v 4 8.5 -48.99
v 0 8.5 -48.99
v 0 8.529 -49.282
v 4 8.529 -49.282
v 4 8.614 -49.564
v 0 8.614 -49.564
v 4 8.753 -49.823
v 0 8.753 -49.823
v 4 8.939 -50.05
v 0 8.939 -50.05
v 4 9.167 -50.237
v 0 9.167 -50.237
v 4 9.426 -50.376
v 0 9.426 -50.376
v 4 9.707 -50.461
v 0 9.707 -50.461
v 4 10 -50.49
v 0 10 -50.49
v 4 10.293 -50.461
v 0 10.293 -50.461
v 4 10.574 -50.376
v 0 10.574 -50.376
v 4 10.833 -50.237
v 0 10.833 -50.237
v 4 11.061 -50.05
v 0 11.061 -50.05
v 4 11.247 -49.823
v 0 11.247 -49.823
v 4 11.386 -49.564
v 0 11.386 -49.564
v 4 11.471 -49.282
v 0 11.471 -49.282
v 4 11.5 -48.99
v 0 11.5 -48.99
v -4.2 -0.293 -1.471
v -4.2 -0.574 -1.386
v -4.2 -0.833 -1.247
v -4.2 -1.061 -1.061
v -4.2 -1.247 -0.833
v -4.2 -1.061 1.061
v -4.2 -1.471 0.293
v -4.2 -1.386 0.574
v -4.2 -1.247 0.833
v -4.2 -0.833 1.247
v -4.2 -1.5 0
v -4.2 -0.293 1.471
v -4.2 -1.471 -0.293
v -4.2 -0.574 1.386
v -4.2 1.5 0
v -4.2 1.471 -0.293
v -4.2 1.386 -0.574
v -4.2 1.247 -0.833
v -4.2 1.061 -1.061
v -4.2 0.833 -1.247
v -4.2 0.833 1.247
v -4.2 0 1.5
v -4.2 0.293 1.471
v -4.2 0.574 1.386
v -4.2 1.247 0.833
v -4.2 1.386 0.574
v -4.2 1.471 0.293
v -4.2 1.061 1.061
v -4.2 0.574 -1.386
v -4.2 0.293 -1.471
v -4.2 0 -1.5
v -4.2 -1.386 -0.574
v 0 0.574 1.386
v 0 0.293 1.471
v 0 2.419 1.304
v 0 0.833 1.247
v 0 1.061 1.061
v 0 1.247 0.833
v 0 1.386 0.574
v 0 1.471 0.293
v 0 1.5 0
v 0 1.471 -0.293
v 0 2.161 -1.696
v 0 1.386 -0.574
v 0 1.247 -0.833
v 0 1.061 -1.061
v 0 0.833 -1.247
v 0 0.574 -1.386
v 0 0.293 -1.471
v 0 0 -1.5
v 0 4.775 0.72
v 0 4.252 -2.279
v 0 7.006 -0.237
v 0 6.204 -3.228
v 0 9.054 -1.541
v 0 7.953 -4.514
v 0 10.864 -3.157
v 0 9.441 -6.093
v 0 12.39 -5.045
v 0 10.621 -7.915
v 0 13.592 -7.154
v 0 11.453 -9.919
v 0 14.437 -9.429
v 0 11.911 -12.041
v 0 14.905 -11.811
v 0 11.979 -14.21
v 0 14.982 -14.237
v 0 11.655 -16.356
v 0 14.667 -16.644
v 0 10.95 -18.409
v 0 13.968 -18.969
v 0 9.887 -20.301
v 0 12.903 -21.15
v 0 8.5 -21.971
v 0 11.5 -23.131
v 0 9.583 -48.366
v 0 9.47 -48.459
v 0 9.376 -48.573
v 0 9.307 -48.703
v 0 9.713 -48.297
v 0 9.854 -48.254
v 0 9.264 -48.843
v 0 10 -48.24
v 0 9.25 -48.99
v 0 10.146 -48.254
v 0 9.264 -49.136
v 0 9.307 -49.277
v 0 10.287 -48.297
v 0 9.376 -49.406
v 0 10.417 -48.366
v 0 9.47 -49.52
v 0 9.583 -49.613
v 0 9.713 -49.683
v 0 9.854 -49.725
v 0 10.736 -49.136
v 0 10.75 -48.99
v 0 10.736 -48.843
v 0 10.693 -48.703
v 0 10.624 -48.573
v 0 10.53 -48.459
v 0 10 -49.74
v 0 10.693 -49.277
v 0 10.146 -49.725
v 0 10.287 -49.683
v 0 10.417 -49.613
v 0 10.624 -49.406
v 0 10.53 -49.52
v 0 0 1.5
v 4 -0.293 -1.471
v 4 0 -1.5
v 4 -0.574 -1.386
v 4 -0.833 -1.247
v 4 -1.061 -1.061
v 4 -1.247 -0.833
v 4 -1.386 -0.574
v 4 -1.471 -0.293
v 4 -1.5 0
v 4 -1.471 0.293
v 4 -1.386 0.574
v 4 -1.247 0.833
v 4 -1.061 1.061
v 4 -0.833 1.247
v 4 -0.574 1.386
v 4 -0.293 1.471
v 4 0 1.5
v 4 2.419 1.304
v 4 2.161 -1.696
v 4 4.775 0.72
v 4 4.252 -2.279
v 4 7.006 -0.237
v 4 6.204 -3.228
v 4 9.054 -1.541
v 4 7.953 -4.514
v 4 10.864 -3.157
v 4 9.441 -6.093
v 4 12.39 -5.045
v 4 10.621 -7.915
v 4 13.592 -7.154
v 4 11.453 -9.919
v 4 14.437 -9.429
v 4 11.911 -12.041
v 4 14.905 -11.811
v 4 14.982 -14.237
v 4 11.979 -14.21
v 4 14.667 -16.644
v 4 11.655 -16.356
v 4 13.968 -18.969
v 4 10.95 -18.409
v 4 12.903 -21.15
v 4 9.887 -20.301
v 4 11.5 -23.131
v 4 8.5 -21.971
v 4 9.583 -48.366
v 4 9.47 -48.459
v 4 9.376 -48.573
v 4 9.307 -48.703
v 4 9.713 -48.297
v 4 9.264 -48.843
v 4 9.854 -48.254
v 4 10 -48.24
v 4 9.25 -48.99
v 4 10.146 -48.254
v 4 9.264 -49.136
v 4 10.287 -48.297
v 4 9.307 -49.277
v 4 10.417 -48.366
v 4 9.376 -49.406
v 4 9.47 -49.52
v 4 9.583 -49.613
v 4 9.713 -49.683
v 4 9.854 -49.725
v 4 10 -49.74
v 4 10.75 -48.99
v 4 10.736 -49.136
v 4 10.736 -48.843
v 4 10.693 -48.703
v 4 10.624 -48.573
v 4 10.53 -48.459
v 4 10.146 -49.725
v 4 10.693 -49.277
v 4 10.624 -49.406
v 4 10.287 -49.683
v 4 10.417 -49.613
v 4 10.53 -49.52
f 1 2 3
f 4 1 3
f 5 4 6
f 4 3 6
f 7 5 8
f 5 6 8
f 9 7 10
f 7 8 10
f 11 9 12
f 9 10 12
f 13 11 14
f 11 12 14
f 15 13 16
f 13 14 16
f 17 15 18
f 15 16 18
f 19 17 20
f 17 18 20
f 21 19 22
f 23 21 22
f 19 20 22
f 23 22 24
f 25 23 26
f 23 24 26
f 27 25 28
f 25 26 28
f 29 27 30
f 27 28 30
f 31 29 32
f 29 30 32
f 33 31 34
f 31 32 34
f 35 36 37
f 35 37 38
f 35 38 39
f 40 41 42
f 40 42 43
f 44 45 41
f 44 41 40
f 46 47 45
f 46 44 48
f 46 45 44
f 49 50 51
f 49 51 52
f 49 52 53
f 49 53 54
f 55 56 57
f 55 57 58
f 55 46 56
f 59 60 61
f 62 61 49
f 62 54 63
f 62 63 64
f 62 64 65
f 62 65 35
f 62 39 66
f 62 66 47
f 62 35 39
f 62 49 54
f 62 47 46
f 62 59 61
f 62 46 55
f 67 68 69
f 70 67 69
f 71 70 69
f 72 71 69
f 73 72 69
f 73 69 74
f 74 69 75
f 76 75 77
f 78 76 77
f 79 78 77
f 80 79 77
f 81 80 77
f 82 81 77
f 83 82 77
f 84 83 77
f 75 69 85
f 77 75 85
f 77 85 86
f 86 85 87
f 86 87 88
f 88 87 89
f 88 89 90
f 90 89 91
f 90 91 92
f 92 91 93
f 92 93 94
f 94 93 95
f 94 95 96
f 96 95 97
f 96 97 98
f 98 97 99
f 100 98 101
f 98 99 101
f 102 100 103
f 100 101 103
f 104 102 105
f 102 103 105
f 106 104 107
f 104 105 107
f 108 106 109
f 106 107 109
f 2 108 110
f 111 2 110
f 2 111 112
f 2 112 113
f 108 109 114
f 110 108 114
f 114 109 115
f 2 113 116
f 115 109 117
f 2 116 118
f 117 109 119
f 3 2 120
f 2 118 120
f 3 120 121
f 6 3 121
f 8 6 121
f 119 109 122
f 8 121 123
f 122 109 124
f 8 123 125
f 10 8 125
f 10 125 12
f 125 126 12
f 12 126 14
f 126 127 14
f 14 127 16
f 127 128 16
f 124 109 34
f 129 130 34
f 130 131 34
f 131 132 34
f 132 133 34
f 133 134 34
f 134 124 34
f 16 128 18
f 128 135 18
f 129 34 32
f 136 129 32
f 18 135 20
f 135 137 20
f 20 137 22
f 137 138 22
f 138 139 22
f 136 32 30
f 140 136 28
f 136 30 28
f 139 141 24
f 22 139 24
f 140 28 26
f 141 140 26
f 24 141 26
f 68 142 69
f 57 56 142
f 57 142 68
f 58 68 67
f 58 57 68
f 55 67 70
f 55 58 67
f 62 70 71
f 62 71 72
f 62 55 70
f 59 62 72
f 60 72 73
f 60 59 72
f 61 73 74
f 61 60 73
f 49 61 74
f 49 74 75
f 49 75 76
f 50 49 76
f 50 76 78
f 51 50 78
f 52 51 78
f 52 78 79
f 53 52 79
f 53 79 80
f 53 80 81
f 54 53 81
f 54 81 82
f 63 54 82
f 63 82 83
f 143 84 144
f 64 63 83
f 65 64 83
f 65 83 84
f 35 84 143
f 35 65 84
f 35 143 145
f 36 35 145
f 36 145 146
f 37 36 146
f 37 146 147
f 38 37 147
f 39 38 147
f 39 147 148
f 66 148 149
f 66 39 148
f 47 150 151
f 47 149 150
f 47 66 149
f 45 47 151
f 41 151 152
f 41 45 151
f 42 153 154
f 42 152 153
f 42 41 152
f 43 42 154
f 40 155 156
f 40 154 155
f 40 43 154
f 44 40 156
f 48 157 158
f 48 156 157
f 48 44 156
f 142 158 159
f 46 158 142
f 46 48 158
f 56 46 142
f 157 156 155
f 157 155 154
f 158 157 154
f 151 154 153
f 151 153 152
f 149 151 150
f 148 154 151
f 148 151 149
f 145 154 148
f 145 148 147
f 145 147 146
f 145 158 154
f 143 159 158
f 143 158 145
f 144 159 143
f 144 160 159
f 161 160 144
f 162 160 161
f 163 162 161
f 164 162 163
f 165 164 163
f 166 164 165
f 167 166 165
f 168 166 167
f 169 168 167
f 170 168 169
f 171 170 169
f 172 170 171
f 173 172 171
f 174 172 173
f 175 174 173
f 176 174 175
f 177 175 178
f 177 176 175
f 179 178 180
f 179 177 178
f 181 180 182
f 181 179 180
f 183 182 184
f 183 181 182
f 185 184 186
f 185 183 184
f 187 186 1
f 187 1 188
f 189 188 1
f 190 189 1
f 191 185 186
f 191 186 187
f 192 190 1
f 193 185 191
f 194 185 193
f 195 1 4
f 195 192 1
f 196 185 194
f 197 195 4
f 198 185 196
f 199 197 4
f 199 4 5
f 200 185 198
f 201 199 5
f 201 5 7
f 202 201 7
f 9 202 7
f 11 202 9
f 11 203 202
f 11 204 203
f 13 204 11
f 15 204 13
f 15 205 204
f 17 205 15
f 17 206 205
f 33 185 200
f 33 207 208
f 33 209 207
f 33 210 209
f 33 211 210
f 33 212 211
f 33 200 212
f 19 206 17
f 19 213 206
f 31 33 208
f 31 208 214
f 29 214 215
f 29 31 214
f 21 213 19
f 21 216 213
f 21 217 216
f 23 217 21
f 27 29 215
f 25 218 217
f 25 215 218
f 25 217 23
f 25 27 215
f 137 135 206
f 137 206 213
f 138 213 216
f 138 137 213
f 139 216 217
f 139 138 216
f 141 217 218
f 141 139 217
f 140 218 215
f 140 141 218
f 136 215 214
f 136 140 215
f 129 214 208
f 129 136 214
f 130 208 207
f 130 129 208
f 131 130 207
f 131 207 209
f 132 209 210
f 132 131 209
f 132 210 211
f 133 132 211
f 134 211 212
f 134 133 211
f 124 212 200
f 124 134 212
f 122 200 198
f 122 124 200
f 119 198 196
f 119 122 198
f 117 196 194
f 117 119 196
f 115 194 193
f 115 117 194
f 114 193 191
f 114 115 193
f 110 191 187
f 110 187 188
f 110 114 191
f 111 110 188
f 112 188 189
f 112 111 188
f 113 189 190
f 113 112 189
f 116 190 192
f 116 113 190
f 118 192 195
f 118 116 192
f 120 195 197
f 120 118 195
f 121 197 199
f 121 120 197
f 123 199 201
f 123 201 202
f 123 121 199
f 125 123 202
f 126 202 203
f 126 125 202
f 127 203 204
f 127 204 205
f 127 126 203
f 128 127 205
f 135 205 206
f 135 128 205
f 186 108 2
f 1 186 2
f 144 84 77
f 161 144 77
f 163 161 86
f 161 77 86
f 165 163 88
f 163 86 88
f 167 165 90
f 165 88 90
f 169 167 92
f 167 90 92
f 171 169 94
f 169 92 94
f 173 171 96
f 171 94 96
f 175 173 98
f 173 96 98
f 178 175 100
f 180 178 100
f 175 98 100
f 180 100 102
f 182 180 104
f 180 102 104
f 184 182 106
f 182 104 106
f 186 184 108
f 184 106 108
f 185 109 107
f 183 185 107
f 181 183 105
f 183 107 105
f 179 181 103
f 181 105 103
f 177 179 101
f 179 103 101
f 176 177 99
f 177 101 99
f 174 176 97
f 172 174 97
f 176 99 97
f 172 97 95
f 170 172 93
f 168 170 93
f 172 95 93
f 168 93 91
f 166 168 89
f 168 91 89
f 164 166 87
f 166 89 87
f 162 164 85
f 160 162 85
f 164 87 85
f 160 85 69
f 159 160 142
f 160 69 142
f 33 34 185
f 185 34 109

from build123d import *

# Parameters (mm, degrees)
SKETCH1_R           = 0.75
BOSS_EXTRUDE1_DEPTH = 4
BOSS_EXTRUDE2_START = 4.2
SKETCH2_R           = 1.5
BOSS_EXTRUDE2_DEPTH = 4.2


with BuildPart() as part:
    # Sketch1 → Boss-Extrude1 (new body)
    with BuildSketch(Plane(origin=(0, 0, 0), x_dir=(0, 0, -1), z_dir=(1, 0, 0))):
        with BuildLine():
            Line((48.989794856, 11.5), (23.130680142, 11.5))
            ThreePointArc((23.130680142, 11.5), (7.154143168, 13.591545205), (-1.5, 0))
            ThreePointArc((-1.5, 0), (0, -1.5), (1.5, 0))
            ThreePointArc((1.5, 0), (8.898176779, 11.08256392), (21.970537173, 8.5))
            Line((21.970537173, 8.5), (48.989794856, 8.5))
            ThreePointArc((48.989794856, 8.5), (50.489794856, 10), (48.989794856, 11.5))
        make_face()
        with Locations((48.989794856, 10)):
            Circle(SKETCH1_R, mode=Mode.SUBTRACT)
    extrude(amount=BOSS_EXTRUDE1_DEPTH)

    # Sketch2 → Boss-Extrude2 (add)
    with BuildSketch(Plane.ZY.offset(BOSS_EXTRUDE2_START)):
        Circle(SKETCH2_R)
    extrude(amount=-BOSS_EXTRUDE2_DEPTH)


solid = part.part
